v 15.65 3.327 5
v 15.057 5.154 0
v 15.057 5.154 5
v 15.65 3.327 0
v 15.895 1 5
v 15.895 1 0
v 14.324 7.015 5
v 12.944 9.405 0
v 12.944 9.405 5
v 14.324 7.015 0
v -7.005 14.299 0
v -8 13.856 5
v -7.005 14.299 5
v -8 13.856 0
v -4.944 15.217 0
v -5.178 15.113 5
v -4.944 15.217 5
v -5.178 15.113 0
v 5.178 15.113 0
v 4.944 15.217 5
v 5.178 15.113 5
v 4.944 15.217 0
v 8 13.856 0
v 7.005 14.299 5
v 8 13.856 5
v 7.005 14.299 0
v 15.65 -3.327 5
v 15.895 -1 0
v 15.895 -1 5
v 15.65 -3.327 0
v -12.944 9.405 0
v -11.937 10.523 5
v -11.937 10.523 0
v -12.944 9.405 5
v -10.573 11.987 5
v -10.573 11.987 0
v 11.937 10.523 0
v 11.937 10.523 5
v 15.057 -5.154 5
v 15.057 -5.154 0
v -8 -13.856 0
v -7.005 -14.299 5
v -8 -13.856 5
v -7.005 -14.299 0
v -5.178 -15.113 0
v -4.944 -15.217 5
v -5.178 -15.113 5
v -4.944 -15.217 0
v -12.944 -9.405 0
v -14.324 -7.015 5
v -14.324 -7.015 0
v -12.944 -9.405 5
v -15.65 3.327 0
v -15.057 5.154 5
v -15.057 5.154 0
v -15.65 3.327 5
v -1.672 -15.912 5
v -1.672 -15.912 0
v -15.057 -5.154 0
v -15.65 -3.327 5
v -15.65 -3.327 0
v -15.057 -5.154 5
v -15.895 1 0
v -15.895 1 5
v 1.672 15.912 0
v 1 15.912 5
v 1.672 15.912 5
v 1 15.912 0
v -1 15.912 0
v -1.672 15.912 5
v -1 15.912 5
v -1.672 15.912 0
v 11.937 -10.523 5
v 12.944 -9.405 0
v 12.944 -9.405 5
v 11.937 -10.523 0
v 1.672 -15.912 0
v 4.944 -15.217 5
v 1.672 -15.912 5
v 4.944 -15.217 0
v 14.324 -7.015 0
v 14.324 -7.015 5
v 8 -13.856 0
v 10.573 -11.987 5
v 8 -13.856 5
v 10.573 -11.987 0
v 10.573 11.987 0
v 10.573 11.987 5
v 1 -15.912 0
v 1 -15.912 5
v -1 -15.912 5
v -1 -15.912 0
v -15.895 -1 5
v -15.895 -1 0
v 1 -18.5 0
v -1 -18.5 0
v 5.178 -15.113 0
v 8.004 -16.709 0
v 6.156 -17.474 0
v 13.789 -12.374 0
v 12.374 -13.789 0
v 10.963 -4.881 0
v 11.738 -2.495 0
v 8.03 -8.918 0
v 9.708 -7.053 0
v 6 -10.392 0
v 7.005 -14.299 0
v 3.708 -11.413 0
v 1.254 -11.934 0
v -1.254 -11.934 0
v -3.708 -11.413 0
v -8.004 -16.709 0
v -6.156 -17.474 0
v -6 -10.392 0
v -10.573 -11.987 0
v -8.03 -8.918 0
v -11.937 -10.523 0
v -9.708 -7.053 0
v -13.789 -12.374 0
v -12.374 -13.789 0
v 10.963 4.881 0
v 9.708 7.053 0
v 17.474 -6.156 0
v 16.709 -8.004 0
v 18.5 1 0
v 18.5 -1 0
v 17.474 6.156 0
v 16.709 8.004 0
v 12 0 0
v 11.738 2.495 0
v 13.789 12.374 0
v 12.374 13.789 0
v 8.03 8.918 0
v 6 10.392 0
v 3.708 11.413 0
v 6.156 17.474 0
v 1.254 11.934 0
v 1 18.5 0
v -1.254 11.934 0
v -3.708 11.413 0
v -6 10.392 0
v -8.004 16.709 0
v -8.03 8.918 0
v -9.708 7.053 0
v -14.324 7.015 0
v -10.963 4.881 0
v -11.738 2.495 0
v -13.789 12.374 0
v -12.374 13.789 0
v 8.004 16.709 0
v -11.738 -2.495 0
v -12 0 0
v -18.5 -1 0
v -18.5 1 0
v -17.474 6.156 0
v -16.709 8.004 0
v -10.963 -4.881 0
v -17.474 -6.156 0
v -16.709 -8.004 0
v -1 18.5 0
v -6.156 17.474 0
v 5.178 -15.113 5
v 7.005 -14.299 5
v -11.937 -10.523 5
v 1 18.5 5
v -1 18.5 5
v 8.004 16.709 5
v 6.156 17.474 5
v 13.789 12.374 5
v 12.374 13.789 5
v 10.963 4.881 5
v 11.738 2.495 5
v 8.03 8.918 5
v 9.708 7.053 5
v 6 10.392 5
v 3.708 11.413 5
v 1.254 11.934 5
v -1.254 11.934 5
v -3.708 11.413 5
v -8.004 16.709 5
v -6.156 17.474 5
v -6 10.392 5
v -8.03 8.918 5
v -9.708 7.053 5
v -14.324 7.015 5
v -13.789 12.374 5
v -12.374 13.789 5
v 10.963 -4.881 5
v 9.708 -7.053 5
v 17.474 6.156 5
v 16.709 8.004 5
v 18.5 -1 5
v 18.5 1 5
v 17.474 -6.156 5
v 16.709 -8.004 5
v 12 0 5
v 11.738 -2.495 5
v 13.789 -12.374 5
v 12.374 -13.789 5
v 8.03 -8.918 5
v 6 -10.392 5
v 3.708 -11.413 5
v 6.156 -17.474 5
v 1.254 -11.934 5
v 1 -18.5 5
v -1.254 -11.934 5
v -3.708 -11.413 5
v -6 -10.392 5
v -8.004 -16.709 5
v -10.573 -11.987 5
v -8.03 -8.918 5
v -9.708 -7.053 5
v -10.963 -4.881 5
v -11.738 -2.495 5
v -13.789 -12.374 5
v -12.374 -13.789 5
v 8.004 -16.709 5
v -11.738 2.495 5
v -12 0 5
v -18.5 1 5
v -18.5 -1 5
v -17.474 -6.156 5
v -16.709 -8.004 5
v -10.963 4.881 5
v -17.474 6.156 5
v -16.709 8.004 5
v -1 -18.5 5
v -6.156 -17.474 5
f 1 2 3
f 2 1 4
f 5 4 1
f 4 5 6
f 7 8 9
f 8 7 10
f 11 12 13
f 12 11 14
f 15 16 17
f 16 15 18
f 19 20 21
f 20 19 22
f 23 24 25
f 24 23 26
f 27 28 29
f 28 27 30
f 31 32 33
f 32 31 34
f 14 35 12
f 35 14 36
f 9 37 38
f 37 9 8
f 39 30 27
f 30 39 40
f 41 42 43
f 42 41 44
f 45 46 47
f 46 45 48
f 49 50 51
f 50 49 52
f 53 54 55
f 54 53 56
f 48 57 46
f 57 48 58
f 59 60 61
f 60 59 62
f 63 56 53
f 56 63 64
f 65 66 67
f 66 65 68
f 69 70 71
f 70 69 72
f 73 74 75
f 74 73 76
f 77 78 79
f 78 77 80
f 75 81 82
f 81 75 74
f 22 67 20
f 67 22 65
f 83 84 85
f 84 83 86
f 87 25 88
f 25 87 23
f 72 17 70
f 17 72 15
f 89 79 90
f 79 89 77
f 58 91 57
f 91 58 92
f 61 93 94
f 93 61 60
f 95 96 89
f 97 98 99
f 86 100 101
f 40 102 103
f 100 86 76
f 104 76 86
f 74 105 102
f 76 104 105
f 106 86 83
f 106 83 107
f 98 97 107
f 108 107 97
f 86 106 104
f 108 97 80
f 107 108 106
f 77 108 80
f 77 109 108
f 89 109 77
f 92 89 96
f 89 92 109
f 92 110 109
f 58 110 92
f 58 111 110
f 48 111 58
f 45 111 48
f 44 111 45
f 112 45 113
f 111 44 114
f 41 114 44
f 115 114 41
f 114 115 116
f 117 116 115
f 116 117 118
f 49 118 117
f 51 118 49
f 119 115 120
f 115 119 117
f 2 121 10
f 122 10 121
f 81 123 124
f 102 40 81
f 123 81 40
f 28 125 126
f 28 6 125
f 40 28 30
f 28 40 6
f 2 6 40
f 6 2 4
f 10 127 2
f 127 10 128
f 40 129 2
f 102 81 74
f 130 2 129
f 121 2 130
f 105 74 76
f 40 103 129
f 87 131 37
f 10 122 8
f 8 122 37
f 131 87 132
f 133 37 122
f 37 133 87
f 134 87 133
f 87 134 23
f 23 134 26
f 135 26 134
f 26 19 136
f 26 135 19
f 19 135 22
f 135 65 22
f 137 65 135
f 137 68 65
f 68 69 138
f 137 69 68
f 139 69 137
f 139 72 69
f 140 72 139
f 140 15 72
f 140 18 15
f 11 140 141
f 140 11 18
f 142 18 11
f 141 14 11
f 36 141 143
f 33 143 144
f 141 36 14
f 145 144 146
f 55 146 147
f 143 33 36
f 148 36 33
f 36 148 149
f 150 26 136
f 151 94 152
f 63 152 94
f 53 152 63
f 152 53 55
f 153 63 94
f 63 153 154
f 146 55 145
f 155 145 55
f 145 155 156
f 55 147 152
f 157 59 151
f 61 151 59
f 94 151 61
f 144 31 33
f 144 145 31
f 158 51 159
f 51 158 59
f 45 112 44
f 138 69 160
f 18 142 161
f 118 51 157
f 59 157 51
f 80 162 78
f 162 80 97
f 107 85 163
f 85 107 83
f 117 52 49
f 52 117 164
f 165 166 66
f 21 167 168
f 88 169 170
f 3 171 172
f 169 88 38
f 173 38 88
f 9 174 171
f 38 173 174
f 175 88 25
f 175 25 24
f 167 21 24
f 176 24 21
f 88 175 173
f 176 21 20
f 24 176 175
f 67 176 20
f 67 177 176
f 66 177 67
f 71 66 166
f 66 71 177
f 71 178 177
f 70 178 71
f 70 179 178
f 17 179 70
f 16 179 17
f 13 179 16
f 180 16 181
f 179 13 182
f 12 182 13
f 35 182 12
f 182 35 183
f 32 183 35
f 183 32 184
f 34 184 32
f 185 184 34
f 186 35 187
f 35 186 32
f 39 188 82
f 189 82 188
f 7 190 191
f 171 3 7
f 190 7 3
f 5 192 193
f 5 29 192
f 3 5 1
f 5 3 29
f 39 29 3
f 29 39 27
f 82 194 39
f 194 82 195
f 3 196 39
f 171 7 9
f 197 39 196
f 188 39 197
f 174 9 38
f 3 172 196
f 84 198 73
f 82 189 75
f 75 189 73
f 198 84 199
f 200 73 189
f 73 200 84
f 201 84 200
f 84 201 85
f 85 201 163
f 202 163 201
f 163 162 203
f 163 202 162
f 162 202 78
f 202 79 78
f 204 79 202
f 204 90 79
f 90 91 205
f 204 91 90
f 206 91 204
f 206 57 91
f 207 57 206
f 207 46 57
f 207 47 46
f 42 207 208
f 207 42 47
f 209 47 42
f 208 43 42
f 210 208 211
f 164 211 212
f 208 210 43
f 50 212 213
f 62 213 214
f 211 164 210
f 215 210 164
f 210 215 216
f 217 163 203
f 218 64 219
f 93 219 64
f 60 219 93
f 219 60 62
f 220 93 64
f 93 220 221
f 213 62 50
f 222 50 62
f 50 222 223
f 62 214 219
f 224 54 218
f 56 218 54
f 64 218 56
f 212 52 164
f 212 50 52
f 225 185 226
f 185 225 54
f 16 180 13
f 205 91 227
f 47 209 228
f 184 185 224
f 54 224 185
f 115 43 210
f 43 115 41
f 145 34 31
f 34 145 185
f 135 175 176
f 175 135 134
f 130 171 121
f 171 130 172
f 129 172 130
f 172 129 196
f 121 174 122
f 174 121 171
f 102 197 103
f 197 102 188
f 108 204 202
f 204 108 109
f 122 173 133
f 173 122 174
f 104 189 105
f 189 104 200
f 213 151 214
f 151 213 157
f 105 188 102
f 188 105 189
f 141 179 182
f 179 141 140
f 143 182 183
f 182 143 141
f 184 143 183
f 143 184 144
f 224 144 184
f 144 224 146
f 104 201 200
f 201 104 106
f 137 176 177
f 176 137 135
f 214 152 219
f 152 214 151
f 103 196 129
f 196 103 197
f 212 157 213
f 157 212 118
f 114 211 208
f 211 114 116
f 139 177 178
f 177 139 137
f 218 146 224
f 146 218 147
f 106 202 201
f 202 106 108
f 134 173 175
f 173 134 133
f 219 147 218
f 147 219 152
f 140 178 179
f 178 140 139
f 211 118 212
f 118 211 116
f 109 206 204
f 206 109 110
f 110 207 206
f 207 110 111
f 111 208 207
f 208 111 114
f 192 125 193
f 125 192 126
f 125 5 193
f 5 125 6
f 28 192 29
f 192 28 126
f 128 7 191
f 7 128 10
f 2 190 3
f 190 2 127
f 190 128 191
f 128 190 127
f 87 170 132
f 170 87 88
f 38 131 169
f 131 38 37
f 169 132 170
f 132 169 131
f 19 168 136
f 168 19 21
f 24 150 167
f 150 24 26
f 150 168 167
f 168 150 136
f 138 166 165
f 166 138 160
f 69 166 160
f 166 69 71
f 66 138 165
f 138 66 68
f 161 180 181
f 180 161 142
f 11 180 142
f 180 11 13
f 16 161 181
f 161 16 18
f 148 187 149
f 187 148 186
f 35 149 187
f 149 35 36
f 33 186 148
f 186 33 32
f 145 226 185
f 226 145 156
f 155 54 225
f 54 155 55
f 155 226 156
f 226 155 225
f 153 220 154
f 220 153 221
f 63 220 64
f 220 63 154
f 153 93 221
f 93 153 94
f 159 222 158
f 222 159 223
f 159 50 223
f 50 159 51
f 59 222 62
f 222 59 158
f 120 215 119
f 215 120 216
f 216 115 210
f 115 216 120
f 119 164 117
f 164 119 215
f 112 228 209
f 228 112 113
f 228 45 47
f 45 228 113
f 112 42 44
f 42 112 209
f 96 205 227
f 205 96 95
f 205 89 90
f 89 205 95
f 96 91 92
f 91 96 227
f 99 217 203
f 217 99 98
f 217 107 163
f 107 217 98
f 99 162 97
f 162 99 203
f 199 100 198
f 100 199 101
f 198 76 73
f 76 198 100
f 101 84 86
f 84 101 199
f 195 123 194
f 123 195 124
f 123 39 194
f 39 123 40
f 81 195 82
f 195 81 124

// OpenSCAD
// Purpose: crown-gear-like ring – teeth evenly spaced via for and rotate.
teeth = 16;
r_in = 12;
r_out = 16;
h = 5;
difference() {
    cylinder(h = h, r = r_out);
    translate([0, 0, -1]) cylinder(h = h + 2, r = r_in);
}
for (i = [0 : teeth - 1])
    rotate([0, 0, i * 360 / teeth])
        translate([r_out - 0.5, -1, 0]) cube([3, 2, h]);
